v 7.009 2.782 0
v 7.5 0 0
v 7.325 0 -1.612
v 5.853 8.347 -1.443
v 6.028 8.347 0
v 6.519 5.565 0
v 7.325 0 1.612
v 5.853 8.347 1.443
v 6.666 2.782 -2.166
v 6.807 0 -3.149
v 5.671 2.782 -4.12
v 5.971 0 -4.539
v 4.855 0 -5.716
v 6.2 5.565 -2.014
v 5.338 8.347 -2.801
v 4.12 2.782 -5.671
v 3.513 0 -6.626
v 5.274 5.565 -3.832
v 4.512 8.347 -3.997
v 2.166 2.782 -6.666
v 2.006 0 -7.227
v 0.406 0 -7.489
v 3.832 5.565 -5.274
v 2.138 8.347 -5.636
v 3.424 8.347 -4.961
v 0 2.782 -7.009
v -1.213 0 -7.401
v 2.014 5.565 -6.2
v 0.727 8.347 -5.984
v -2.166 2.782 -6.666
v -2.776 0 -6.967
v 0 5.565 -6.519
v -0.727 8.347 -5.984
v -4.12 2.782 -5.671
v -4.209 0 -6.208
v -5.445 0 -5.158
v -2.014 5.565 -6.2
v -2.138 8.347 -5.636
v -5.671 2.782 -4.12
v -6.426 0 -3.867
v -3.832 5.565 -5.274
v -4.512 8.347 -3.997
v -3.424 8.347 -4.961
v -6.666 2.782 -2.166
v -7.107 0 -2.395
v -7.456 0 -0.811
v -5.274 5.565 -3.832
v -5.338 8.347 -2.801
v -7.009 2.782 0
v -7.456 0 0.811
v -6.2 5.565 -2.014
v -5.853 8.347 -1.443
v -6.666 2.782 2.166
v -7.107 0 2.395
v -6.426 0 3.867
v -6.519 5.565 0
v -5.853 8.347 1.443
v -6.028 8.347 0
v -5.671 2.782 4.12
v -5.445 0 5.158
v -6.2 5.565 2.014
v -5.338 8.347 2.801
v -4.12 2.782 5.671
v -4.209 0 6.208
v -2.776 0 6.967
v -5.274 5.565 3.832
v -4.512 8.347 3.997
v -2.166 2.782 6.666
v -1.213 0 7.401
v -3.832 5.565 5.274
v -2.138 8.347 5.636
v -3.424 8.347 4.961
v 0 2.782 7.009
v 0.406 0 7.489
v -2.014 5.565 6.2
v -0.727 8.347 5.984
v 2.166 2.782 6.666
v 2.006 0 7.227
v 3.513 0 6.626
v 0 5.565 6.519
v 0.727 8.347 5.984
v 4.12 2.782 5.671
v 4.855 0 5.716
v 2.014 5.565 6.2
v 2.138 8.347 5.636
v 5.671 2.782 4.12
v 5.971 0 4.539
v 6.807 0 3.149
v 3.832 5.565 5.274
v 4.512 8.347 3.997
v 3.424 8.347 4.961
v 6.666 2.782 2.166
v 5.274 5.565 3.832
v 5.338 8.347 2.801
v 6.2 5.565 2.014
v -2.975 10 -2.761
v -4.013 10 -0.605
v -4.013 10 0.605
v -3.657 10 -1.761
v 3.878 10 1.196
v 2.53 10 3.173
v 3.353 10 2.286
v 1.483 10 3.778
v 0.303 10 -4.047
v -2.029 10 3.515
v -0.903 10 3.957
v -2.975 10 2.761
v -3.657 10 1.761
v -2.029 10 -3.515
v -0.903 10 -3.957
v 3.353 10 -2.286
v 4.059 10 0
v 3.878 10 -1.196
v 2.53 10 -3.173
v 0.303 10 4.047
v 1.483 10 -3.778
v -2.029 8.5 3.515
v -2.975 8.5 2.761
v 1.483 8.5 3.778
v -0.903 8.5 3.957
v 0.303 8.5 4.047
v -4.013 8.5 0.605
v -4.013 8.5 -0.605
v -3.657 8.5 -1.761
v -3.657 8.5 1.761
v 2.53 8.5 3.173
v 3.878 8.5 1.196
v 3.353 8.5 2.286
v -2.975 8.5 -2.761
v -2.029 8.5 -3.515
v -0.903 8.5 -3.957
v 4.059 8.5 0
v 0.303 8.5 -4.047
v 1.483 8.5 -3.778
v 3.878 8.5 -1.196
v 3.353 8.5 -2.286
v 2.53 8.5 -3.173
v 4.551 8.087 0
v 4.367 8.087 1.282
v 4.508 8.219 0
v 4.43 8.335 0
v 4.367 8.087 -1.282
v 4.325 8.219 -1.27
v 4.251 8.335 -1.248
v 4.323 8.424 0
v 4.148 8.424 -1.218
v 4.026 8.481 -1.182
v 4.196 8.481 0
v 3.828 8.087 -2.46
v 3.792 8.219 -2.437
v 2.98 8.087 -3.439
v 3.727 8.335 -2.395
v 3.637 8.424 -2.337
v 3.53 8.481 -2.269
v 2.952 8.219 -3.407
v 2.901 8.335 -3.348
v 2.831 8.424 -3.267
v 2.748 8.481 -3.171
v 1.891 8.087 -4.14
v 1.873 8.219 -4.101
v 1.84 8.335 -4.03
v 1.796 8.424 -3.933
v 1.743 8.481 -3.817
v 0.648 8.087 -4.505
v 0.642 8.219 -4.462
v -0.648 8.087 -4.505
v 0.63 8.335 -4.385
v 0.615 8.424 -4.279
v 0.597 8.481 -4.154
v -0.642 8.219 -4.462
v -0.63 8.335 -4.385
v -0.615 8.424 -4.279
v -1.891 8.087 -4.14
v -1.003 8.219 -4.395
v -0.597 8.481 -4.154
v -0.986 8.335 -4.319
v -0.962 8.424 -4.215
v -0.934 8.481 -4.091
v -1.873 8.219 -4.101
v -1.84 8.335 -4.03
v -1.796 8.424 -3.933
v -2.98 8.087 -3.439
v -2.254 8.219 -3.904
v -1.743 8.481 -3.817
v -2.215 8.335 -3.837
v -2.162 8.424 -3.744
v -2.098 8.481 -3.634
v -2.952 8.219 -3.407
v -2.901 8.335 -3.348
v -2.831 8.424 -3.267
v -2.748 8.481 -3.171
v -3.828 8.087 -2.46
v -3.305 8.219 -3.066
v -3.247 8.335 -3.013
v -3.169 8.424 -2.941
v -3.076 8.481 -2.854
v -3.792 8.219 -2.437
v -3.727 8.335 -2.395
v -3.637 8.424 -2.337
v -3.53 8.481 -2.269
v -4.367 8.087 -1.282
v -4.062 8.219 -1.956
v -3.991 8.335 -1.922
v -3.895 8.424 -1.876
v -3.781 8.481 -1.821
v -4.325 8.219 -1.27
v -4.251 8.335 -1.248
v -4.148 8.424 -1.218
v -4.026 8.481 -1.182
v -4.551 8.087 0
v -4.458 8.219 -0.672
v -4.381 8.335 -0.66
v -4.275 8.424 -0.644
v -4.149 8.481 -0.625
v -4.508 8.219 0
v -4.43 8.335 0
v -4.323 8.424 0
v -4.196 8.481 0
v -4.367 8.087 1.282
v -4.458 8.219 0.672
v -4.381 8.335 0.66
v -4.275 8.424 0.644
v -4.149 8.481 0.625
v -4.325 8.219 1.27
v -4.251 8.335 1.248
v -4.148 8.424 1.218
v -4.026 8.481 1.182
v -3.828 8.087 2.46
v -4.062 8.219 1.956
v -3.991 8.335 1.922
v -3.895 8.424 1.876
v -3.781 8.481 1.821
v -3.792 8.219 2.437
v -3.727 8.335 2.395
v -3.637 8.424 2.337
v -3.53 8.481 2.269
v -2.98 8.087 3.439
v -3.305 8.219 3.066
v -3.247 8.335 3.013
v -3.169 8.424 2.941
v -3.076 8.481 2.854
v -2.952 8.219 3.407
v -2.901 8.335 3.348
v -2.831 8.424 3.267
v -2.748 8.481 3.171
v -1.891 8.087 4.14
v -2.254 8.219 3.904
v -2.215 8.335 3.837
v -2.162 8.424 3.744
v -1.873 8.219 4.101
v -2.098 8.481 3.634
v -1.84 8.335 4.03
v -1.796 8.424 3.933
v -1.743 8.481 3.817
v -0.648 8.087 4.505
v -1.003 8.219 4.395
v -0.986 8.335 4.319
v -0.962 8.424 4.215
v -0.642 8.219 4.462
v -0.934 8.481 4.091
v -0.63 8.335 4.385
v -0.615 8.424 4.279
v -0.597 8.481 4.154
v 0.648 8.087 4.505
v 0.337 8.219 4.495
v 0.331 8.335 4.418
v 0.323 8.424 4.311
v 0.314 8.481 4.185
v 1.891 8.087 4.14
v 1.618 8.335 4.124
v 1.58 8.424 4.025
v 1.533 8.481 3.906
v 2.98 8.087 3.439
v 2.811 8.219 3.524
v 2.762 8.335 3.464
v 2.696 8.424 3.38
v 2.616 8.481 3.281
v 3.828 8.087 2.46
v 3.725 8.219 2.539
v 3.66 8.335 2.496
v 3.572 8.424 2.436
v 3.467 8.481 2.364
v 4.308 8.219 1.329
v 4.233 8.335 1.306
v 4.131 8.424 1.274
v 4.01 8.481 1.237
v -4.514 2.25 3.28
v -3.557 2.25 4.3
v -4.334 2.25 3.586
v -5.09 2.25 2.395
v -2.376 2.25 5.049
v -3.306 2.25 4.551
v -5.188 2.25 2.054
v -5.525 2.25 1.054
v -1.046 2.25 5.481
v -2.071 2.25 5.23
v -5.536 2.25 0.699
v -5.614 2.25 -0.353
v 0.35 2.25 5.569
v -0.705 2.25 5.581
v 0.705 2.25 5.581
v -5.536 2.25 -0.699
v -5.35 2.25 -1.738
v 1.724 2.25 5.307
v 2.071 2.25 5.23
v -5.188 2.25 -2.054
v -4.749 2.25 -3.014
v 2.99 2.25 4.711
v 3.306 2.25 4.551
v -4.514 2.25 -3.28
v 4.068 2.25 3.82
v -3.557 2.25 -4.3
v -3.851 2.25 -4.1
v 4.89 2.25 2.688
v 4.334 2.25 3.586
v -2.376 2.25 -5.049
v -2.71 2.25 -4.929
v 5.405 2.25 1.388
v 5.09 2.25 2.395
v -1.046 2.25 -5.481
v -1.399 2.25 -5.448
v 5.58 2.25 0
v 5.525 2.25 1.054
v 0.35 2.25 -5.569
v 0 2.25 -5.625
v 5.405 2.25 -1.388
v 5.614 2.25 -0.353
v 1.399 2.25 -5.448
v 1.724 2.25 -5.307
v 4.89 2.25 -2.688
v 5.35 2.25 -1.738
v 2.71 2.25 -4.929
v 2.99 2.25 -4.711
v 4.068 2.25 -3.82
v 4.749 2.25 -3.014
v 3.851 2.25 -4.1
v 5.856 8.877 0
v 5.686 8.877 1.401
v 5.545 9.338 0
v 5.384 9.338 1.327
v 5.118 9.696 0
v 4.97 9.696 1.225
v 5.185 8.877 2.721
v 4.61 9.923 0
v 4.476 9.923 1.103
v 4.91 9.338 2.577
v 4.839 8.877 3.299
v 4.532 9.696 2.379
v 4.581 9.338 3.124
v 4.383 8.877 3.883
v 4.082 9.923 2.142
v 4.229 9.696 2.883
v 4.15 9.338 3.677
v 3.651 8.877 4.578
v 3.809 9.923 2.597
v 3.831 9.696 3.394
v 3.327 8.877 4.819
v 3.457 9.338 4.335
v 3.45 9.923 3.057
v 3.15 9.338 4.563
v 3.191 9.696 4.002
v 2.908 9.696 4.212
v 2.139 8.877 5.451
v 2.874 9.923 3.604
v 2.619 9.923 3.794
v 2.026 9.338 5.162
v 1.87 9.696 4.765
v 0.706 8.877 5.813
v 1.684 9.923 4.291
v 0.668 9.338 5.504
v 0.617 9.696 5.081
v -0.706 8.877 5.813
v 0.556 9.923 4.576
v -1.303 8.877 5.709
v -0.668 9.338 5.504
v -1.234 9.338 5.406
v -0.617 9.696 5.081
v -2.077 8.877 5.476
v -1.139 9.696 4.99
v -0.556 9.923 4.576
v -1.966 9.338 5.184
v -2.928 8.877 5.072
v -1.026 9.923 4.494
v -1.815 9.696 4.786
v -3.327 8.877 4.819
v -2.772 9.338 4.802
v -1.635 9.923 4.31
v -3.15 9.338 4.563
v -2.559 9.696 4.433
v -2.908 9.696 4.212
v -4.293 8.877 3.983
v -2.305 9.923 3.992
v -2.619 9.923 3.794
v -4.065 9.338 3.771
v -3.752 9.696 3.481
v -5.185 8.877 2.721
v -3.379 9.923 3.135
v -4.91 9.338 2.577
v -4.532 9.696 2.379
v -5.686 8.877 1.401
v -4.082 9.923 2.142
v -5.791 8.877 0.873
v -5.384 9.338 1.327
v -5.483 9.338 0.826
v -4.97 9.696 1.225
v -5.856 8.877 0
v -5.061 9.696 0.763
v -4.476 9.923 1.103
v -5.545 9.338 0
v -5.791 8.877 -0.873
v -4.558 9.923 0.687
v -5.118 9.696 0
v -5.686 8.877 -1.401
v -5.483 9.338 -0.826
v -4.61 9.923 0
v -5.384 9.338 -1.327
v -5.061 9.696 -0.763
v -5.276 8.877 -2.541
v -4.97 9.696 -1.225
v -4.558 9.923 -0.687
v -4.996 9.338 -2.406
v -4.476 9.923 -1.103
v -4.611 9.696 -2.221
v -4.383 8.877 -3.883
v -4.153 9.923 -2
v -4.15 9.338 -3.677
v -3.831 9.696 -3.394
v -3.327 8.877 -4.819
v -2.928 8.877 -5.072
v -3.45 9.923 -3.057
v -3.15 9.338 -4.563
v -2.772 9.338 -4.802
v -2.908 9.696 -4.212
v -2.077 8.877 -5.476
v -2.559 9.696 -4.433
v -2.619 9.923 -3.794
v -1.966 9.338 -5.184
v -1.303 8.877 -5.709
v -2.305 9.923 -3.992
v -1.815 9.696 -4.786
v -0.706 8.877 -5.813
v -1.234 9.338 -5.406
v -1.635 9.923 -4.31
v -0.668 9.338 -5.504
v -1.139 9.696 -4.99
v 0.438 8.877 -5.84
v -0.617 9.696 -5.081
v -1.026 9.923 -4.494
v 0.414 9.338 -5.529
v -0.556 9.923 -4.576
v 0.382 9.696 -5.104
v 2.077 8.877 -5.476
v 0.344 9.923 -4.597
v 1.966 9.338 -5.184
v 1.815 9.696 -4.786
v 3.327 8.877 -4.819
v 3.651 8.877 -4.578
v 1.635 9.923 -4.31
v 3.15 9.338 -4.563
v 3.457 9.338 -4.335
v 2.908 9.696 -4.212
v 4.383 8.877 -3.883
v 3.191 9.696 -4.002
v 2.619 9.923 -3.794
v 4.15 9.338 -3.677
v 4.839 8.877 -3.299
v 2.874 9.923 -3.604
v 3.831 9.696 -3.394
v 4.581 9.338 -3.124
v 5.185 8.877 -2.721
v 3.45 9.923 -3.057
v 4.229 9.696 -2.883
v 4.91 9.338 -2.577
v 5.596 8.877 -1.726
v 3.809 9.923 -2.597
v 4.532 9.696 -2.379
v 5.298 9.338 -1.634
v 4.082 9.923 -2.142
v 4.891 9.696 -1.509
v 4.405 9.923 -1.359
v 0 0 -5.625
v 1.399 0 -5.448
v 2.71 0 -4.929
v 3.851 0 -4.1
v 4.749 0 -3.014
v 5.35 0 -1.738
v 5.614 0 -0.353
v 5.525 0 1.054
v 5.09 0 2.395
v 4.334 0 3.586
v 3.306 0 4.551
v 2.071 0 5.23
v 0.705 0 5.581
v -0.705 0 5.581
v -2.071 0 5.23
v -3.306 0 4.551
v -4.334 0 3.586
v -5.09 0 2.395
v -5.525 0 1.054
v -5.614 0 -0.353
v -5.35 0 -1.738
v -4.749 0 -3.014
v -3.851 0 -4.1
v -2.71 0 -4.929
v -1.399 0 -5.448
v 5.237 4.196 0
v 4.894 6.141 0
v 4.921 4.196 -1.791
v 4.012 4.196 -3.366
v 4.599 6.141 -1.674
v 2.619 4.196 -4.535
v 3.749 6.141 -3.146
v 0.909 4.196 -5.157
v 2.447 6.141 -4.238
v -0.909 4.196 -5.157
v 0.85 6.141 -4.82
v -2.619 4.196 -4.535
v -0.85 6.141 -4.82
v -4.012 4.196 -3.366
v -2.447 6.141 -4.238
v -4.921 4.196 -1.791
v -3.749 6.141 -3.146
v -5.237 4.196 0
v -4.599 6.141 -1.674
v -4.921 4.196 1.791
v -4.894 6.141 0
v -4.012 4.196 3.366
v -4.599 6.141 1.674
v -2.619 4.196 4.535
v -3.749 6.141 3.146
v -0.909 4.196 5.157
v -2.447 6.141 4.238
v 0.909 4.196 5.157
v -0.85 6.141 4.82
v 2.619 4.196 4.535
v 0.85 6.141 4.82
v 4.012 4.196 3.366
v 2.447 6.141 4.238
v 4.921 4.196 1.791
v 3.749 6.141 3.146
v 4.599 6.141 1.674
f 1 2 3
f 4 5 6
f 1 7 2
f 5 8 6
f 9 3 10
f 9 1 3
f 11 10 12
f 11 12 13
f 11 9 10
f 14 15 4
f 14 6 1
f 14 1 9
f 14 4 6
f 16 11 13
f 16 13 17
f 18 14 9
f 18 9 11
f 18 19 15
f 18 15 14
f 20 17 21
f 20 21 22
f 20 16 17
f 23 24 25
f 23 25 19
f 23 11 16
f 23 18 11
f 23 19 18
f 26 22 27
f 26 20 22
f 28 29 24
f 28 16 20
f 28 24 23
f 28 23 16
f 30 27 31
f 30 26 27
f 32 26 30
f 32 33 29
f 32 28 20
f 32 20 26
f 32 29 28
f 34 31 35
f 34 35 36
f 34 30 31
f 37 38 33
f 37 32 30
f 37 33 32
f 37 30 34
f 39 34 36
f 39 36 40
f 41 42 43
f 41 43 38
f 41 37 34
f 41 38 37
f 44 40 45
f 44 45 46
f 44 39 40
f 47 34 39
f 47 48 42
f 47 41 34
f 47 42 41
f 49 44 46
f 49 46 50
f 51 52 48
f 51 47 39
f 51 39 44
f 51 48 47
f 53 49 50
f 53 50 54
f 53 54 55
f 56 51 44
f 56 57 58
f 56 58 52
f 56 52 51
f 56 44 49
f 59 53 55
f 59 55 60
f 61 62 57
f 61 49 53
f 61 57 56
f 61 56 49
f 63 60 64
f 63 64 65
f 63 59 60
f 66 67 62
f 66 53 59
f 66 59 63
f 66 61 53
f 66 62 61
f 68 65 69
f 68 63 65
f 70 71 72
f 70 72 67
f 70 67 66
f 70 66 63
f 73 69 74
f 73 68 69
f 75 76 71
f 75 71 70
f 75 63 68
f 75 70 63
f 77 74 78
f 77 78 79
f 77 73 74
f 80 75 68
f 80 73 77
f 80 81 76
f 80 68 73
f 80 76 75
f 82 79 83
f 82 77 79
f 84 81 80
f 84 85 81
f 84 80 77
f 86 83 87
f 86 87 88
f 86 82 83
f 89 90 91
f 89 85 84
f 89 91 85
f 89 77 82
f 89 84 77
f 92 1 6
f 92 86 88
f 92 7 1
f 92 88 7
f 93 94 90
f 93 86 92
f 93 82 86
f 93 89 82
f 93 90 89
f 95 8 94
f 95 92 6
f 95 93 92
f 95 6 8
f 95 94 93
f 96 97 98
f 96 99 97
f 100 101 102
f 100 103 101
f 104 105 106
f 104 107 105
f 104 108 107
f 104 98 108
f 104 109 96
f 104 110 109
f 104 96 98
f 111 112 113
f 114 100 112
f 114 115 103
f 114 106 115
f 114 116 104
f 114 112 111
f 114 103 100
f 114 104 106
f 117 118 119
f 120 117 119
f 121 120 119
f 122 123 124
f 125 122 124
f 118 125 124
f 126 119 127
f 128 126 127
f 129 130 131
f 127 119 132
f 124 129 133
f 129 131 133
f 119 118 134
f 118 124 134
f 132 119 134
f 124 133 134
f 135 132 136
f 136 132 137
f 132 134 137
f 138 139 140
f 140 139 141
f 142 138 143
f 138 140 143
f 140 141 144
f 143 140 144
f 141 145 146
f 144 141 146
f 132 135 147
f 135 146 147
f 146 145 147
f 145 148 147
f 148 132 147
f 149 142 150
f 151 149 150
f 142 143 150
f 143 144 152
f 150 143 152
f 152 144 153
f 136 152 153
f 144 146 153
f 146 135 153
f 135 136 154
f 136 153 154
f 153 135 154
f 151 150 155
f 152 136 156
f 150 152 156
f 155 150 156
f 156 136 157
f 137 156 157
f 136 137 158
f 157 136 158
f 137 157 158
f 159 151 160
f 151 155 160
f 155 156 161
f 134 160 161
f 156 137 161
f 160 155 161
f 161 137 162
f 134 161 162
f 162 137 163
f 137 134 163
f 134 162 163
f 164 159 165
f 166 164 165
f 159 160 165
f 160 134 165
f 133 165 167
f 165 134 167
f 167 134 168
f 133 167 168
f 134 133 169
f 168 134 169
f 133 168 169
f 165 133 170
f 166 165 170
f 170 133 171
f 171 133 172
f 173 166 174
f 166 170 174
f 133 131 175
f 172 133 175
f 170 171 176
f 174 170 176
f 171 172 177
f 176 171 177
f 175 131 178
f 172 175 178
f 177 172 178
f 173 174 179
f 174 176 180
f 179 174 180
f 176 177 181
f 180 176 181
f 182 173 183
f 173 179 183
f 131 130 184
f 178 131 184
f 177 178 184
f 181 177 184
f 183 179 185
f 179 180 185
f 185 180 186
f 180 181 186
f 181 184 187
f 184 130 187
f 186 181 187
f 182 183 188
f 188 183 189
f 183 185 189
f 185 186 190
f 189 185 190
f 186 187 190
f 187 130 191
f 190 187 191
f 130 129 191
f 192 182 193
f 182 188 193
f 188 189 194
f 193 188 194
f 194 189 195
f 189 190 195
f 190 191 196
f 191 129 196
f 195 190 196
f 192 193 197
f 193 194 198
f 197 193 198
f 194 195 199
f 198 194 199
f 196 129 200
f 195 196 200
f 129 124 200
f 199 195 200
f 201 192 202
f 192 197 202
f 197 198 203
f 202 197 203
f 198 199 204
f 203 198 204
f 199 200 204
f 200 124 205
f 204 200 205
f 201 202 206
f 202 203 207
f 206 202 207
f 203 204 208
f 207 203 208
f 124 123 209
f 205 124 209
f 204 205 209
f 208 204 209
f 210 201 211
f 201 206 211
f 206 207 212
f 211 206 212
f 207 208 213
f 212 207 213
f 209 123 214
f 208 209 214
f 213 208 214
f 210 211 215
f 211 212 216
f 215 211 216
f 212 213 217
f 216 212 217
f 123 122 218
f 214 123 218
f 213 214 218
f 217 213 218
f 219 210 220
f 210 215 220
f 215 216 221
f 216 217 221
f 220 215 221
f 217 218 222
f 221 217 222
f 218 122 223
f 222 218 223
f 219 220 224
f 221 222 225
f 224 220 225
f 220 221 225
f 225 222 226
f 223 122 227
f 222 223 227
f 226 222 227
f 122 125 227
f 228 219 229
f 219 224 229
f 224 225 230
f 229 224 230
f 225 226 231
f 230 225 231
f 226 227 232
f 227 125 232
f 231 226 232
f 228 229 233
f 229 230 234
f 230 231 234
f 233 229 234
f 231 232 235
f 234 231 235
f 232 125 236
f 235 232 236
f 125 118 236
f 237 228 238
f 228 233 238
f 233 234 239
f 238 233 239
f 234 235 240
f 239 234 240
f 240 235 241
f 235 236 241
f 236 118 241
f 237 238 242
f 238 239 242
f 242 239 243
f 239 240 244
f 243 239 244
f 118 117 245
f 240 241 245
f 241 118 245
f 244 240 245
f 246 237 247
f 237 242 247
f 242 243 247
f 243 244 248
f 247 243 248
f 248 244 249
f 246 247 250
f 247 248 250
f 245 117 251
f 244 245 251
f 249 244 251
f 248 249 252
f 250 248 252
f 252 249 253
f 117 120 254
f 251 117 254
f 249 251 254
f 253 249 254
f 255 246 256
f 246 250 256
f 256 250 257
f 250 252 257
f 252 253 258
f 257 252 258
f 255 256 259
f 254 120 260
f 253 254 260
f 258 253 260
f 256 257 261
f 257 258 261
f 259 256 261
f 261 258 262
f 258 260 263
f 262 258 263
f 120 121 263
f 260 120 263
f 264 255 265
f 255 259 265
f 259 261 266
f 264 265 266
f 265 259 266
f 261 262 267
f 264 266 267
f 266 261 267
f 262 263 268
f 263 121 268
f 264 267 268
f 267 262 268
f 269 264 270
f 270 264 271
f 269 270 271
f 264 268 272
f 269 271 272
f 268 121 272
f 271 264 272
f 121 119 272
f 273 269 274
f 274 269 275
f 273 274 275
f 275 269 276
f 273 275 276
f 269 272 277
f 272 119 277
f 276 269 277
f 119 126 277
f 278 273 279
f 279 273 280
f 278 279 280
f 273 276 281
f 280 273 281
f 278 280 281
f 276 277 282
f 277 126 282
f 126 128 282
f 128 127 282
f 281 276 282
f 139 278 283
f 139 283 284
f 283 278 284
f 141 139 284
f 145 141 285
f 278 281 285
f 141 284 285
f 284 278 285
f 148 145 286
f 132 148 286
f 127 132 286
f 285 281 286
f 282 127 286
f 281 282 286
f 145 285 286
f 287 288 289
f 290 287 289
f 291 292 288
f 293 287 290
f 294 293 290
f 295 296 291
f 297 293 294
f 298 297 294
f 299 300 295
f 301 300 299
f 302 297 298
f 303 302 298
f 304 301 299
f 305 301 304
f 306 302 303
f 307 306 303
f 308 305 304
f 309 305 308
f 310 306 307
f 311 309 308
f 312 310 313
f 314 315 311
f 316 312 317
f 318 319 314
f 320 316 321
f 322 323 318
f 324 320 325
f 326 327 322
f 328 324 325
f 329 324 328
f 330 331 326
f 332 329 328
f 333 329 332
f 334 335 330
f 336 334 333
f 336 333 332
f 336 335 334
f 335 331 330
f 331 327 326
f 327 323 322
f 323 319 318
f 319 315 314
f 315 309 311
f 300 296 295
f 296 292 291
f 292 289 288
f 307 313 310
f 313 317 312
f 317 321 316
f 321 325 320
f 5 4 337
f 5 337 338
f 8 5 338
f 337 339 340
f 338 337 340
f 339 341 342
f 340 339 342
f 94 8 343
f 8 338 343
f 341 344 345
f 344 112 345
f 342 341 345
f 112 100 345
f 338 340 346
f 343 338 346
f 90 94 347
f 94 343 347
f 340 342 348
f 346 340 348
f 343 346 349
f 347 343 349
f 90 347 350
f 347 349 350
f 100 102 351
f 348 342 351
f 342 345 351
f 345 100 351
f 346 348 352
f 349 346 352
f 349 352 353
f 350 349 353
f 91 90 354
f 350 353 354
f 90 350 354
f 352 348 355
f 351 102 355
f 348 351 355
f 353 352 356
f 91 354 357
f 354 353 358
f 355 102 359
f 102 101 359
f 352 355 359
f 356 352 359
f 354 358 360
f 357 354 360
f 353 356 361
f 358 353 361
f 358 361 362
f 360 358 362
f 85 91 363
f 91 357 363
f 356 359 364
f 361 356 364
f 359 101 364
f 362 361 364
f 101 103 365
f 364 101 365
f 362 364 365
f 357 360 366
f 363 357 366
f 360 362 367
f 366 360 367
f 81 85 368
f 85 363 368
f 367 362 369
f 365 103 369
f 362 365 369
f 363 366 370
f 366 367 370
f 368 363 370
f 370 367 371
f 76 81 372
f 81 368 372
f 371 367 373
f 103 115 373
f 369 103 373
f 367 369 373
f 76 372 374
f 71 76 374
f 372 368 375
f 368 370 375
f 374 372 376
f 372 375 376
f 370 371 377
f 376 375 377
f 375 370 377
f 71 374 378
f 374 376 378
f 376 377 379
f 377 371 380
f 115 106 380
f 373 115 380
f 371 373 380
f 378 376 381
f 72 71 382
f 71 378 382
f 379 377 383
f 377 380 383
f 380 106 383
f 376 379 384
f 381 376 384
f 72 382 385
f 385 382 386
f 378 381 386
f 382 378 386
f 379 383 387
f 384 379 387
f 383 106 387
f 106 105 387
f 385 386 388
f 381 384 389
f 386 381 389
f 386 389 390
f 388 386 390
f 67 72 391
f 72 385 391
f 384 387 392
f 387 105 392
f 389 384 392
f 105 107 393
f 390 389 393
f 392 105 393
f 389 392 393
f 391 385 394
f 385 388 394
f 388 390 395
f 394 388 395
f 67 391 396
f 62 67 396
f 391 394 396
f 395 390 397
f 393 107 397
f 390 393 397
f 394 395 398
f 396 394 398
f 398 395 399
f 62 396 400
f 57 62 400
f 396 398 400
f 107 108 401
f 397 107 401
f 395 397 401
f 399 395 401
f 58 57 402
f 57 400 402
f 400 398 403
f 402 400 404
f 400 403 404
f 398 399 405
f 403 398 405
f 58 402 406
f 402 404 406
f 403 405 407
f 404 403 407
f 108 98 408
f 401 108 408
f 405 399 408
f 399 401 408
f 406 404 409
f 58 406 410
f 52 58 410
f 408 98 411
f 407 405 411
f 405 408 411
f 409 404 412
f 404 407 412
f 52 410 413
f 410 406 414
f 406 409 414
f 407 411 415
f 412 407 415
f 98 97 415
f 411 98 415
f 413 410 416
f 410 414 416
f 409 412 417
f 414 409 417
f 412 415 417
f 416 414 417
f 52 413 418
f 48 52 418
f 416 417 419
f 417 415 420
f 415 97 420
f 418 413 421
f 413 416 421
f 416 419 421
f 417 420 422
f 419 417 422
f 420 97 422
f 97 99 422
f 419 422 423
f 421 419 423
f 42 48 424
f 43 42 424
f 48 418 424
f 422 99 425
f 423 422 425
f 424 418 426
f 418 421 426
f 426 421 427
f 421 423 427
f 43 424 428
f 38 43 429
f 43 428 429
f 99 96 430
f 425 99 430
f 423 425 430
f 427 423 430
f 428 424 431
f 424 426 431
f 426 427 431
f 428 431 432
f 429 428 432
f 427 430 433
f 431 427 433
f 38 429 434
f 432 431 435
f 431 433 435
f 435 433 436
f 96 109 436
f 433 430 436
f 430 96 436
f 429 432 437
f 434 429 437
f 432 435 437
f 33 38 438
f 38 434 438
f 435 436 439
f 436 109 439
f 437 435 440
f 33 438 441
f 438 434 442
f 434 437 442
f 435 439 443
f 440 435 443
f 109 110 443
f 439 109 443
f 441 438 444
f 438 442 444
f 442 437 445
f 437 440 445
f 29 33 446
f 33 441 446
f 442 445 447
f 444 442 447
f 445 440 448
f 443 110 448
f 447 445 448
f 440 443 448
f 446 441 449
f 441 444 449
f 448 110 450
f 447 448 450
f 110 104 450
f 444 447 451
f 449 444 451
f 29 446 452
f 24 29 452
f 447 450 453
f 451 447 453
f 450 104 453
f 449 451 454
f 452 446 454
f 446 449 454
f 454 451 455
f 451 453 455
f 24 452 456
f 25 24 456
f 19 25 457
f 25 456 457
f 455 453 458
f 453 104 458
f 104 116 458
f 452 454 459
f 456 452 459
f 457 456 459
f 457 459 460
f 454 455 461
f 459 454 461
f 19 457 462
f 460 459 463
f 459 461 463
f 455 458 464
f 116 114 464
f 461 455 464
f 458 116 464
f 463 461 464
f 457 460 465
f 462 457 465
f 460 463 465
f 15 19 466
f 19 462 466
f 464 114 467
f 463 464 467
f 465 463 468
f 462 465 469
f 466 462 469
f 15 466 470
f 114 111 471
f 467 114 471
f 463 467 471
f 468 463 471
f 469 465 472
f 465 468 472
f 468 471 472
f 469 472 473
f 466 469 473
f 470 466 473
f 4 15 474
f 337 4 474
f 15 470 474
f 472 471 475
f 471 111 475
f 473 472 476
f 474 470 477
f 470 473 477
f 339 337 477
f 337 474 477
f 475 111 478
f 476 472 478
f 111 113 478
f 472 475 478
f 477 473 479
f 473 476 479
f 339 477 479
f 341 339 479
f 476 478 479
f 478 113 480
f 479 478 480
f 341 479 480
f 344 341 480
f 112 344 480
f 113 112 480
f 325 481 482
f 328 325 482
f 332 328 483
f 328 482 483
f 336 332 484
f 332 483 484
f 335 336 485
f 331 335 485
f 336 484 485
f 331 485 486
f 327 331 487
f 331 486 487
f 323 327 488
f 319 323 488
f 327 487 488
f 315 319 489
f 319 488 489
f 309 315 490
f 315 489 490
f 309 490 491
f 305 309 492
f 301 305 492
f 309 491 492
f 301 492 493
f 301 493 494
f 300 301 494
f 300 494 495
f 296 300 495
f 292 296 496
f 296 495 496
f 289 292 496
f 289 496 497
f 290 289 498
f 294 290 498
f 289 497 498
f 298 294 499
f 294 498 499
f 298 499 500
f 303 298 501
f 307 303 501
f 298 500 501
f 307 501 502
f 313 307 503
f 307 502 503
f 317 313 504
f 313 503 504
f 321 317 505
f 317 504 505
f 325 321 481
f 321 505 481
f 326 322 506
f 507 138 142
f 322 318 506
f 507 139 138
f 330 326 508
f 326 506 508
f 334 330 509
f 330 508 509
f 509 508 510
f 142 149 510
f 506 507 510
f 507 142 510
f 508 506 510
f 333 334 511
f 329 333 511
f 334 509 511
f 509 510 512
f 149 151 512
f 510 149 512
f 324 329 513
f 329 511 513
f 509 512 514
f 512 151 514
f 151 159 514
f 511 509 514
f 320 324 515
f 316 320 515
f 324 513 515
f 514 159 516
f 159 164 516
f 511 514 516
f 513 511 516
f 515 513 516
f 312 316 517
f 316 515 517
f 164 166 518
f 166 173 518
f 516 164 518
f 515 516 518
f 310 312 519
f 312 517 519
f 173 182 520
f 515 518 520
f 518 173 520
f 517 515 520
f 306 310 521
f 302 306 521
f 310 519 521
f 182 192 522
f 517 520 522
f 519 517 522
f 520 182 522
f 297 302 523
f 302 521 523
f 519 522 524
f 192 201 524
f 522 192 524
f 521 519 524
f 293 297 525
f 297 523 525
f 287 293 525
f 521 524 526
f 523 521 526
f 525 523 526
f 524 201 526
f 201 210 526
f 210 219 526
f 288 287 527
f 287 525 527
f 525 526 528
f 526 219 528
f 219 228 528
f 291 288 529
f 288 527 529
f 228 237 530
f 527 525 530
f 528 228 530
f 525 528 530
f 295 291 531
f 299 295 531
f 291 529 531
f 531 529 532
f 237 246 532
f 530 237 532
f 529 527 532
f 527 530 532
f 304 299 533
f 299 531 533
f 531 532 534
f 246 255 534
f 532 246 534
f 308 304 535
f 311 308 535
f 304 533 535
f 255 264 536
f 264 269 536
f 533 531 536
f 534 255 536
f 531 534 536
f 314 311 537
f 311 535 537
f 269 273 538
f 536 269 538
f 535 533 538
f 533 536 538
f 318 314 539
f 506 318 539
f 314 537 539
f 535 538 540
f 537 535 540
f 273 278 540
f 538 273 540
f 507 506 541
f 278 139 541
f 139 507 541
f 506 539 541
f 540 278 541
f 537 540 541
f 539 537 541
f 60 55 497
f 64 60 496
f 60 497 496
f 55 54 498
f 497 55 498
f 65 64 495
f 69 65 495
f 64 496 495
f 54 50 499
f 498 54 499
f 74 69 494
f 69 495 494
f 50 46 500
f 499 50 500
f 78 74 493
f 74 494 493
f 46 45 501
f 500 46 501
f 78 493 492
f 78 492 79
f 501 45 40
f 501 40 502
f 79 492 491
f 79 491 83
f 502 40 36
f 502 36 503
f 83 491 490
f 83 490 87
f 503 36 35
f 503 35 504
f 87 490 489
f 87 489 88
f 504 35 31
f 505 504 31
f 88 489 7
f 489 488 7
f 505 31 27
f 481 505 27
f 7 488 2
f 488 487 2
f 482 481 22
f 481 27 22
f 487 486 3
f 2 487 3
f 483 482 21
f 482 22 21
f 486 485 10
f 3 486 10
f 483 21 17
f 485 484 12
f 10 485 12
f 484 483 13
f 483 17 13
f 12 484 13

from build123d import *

# Parameters (mm, degrees)
SKETCH1_R           = 7.5
BOSS_EXTRUDE1_DEPTH = 10
BOSS_EXTRUDE1_TAPER = 10
SKETCH2_R           = 5.625
CUT_EXTRUDE1_DEPTH  = 2.25
FILLET1_R           = 2


# Read off the part's stored shape, not the designer's step: Shell2
with BuildPart() as part:
    # Sketch1 → Boss-Extrude1 (new body)
    with BuildSketch(Plane(origin=(0, 0, 0), x_dir=(1, 0, 0), z_dir=(0, 1, 0))):
        Circle(SKETCH1_R)
    extrude(amount=BOSS_EXTRUDE1_DEPTH, taper=BOSS_EXTRUDE1_TAPER)

    # Sketch2 → Cut-Extrude1 (cut)
    with BuildSketch(Plane.XZ):
        with Locations(Location((0, 0, 0), (0, 0, 270))):
            Circle(SKETCH2_R)
    extrude(amount=-CUT_EXTRUDE1_DEPTH, mode=Mode.SUBTRACT)

    # Fillet1
    fillet1_edges = [part.edges().sort_by_distance(p)[0] for p in [
        (-5.736730193, 10, 0),
    ]]
    fillet(fillet1_edges, radius=FILLET1_R)

    # Shell2 outline → Shell2 (revolve, cut)
    with BuildSketch(Plane.XY):
        with BuildLine():
            Line((5.580124376, 2.25), (4.550934807, 8.086824089))
            ThreePointArc((4.550934807, 8.086824089), (4.379924736, 8.383022222), (4.058530931, 8.5))
            Line((4.058530931, 8.5), (0, 8.5))
            Line((0, 8.5), (0, 2.25))
            Line((0, 2.25), (5.580124376, 2.25))
        make_face()
    revolve(axis=Axis((0, 0, 0), (0, 1, 0)), mode=Mode.SUBTRACT)


solid = part.part
